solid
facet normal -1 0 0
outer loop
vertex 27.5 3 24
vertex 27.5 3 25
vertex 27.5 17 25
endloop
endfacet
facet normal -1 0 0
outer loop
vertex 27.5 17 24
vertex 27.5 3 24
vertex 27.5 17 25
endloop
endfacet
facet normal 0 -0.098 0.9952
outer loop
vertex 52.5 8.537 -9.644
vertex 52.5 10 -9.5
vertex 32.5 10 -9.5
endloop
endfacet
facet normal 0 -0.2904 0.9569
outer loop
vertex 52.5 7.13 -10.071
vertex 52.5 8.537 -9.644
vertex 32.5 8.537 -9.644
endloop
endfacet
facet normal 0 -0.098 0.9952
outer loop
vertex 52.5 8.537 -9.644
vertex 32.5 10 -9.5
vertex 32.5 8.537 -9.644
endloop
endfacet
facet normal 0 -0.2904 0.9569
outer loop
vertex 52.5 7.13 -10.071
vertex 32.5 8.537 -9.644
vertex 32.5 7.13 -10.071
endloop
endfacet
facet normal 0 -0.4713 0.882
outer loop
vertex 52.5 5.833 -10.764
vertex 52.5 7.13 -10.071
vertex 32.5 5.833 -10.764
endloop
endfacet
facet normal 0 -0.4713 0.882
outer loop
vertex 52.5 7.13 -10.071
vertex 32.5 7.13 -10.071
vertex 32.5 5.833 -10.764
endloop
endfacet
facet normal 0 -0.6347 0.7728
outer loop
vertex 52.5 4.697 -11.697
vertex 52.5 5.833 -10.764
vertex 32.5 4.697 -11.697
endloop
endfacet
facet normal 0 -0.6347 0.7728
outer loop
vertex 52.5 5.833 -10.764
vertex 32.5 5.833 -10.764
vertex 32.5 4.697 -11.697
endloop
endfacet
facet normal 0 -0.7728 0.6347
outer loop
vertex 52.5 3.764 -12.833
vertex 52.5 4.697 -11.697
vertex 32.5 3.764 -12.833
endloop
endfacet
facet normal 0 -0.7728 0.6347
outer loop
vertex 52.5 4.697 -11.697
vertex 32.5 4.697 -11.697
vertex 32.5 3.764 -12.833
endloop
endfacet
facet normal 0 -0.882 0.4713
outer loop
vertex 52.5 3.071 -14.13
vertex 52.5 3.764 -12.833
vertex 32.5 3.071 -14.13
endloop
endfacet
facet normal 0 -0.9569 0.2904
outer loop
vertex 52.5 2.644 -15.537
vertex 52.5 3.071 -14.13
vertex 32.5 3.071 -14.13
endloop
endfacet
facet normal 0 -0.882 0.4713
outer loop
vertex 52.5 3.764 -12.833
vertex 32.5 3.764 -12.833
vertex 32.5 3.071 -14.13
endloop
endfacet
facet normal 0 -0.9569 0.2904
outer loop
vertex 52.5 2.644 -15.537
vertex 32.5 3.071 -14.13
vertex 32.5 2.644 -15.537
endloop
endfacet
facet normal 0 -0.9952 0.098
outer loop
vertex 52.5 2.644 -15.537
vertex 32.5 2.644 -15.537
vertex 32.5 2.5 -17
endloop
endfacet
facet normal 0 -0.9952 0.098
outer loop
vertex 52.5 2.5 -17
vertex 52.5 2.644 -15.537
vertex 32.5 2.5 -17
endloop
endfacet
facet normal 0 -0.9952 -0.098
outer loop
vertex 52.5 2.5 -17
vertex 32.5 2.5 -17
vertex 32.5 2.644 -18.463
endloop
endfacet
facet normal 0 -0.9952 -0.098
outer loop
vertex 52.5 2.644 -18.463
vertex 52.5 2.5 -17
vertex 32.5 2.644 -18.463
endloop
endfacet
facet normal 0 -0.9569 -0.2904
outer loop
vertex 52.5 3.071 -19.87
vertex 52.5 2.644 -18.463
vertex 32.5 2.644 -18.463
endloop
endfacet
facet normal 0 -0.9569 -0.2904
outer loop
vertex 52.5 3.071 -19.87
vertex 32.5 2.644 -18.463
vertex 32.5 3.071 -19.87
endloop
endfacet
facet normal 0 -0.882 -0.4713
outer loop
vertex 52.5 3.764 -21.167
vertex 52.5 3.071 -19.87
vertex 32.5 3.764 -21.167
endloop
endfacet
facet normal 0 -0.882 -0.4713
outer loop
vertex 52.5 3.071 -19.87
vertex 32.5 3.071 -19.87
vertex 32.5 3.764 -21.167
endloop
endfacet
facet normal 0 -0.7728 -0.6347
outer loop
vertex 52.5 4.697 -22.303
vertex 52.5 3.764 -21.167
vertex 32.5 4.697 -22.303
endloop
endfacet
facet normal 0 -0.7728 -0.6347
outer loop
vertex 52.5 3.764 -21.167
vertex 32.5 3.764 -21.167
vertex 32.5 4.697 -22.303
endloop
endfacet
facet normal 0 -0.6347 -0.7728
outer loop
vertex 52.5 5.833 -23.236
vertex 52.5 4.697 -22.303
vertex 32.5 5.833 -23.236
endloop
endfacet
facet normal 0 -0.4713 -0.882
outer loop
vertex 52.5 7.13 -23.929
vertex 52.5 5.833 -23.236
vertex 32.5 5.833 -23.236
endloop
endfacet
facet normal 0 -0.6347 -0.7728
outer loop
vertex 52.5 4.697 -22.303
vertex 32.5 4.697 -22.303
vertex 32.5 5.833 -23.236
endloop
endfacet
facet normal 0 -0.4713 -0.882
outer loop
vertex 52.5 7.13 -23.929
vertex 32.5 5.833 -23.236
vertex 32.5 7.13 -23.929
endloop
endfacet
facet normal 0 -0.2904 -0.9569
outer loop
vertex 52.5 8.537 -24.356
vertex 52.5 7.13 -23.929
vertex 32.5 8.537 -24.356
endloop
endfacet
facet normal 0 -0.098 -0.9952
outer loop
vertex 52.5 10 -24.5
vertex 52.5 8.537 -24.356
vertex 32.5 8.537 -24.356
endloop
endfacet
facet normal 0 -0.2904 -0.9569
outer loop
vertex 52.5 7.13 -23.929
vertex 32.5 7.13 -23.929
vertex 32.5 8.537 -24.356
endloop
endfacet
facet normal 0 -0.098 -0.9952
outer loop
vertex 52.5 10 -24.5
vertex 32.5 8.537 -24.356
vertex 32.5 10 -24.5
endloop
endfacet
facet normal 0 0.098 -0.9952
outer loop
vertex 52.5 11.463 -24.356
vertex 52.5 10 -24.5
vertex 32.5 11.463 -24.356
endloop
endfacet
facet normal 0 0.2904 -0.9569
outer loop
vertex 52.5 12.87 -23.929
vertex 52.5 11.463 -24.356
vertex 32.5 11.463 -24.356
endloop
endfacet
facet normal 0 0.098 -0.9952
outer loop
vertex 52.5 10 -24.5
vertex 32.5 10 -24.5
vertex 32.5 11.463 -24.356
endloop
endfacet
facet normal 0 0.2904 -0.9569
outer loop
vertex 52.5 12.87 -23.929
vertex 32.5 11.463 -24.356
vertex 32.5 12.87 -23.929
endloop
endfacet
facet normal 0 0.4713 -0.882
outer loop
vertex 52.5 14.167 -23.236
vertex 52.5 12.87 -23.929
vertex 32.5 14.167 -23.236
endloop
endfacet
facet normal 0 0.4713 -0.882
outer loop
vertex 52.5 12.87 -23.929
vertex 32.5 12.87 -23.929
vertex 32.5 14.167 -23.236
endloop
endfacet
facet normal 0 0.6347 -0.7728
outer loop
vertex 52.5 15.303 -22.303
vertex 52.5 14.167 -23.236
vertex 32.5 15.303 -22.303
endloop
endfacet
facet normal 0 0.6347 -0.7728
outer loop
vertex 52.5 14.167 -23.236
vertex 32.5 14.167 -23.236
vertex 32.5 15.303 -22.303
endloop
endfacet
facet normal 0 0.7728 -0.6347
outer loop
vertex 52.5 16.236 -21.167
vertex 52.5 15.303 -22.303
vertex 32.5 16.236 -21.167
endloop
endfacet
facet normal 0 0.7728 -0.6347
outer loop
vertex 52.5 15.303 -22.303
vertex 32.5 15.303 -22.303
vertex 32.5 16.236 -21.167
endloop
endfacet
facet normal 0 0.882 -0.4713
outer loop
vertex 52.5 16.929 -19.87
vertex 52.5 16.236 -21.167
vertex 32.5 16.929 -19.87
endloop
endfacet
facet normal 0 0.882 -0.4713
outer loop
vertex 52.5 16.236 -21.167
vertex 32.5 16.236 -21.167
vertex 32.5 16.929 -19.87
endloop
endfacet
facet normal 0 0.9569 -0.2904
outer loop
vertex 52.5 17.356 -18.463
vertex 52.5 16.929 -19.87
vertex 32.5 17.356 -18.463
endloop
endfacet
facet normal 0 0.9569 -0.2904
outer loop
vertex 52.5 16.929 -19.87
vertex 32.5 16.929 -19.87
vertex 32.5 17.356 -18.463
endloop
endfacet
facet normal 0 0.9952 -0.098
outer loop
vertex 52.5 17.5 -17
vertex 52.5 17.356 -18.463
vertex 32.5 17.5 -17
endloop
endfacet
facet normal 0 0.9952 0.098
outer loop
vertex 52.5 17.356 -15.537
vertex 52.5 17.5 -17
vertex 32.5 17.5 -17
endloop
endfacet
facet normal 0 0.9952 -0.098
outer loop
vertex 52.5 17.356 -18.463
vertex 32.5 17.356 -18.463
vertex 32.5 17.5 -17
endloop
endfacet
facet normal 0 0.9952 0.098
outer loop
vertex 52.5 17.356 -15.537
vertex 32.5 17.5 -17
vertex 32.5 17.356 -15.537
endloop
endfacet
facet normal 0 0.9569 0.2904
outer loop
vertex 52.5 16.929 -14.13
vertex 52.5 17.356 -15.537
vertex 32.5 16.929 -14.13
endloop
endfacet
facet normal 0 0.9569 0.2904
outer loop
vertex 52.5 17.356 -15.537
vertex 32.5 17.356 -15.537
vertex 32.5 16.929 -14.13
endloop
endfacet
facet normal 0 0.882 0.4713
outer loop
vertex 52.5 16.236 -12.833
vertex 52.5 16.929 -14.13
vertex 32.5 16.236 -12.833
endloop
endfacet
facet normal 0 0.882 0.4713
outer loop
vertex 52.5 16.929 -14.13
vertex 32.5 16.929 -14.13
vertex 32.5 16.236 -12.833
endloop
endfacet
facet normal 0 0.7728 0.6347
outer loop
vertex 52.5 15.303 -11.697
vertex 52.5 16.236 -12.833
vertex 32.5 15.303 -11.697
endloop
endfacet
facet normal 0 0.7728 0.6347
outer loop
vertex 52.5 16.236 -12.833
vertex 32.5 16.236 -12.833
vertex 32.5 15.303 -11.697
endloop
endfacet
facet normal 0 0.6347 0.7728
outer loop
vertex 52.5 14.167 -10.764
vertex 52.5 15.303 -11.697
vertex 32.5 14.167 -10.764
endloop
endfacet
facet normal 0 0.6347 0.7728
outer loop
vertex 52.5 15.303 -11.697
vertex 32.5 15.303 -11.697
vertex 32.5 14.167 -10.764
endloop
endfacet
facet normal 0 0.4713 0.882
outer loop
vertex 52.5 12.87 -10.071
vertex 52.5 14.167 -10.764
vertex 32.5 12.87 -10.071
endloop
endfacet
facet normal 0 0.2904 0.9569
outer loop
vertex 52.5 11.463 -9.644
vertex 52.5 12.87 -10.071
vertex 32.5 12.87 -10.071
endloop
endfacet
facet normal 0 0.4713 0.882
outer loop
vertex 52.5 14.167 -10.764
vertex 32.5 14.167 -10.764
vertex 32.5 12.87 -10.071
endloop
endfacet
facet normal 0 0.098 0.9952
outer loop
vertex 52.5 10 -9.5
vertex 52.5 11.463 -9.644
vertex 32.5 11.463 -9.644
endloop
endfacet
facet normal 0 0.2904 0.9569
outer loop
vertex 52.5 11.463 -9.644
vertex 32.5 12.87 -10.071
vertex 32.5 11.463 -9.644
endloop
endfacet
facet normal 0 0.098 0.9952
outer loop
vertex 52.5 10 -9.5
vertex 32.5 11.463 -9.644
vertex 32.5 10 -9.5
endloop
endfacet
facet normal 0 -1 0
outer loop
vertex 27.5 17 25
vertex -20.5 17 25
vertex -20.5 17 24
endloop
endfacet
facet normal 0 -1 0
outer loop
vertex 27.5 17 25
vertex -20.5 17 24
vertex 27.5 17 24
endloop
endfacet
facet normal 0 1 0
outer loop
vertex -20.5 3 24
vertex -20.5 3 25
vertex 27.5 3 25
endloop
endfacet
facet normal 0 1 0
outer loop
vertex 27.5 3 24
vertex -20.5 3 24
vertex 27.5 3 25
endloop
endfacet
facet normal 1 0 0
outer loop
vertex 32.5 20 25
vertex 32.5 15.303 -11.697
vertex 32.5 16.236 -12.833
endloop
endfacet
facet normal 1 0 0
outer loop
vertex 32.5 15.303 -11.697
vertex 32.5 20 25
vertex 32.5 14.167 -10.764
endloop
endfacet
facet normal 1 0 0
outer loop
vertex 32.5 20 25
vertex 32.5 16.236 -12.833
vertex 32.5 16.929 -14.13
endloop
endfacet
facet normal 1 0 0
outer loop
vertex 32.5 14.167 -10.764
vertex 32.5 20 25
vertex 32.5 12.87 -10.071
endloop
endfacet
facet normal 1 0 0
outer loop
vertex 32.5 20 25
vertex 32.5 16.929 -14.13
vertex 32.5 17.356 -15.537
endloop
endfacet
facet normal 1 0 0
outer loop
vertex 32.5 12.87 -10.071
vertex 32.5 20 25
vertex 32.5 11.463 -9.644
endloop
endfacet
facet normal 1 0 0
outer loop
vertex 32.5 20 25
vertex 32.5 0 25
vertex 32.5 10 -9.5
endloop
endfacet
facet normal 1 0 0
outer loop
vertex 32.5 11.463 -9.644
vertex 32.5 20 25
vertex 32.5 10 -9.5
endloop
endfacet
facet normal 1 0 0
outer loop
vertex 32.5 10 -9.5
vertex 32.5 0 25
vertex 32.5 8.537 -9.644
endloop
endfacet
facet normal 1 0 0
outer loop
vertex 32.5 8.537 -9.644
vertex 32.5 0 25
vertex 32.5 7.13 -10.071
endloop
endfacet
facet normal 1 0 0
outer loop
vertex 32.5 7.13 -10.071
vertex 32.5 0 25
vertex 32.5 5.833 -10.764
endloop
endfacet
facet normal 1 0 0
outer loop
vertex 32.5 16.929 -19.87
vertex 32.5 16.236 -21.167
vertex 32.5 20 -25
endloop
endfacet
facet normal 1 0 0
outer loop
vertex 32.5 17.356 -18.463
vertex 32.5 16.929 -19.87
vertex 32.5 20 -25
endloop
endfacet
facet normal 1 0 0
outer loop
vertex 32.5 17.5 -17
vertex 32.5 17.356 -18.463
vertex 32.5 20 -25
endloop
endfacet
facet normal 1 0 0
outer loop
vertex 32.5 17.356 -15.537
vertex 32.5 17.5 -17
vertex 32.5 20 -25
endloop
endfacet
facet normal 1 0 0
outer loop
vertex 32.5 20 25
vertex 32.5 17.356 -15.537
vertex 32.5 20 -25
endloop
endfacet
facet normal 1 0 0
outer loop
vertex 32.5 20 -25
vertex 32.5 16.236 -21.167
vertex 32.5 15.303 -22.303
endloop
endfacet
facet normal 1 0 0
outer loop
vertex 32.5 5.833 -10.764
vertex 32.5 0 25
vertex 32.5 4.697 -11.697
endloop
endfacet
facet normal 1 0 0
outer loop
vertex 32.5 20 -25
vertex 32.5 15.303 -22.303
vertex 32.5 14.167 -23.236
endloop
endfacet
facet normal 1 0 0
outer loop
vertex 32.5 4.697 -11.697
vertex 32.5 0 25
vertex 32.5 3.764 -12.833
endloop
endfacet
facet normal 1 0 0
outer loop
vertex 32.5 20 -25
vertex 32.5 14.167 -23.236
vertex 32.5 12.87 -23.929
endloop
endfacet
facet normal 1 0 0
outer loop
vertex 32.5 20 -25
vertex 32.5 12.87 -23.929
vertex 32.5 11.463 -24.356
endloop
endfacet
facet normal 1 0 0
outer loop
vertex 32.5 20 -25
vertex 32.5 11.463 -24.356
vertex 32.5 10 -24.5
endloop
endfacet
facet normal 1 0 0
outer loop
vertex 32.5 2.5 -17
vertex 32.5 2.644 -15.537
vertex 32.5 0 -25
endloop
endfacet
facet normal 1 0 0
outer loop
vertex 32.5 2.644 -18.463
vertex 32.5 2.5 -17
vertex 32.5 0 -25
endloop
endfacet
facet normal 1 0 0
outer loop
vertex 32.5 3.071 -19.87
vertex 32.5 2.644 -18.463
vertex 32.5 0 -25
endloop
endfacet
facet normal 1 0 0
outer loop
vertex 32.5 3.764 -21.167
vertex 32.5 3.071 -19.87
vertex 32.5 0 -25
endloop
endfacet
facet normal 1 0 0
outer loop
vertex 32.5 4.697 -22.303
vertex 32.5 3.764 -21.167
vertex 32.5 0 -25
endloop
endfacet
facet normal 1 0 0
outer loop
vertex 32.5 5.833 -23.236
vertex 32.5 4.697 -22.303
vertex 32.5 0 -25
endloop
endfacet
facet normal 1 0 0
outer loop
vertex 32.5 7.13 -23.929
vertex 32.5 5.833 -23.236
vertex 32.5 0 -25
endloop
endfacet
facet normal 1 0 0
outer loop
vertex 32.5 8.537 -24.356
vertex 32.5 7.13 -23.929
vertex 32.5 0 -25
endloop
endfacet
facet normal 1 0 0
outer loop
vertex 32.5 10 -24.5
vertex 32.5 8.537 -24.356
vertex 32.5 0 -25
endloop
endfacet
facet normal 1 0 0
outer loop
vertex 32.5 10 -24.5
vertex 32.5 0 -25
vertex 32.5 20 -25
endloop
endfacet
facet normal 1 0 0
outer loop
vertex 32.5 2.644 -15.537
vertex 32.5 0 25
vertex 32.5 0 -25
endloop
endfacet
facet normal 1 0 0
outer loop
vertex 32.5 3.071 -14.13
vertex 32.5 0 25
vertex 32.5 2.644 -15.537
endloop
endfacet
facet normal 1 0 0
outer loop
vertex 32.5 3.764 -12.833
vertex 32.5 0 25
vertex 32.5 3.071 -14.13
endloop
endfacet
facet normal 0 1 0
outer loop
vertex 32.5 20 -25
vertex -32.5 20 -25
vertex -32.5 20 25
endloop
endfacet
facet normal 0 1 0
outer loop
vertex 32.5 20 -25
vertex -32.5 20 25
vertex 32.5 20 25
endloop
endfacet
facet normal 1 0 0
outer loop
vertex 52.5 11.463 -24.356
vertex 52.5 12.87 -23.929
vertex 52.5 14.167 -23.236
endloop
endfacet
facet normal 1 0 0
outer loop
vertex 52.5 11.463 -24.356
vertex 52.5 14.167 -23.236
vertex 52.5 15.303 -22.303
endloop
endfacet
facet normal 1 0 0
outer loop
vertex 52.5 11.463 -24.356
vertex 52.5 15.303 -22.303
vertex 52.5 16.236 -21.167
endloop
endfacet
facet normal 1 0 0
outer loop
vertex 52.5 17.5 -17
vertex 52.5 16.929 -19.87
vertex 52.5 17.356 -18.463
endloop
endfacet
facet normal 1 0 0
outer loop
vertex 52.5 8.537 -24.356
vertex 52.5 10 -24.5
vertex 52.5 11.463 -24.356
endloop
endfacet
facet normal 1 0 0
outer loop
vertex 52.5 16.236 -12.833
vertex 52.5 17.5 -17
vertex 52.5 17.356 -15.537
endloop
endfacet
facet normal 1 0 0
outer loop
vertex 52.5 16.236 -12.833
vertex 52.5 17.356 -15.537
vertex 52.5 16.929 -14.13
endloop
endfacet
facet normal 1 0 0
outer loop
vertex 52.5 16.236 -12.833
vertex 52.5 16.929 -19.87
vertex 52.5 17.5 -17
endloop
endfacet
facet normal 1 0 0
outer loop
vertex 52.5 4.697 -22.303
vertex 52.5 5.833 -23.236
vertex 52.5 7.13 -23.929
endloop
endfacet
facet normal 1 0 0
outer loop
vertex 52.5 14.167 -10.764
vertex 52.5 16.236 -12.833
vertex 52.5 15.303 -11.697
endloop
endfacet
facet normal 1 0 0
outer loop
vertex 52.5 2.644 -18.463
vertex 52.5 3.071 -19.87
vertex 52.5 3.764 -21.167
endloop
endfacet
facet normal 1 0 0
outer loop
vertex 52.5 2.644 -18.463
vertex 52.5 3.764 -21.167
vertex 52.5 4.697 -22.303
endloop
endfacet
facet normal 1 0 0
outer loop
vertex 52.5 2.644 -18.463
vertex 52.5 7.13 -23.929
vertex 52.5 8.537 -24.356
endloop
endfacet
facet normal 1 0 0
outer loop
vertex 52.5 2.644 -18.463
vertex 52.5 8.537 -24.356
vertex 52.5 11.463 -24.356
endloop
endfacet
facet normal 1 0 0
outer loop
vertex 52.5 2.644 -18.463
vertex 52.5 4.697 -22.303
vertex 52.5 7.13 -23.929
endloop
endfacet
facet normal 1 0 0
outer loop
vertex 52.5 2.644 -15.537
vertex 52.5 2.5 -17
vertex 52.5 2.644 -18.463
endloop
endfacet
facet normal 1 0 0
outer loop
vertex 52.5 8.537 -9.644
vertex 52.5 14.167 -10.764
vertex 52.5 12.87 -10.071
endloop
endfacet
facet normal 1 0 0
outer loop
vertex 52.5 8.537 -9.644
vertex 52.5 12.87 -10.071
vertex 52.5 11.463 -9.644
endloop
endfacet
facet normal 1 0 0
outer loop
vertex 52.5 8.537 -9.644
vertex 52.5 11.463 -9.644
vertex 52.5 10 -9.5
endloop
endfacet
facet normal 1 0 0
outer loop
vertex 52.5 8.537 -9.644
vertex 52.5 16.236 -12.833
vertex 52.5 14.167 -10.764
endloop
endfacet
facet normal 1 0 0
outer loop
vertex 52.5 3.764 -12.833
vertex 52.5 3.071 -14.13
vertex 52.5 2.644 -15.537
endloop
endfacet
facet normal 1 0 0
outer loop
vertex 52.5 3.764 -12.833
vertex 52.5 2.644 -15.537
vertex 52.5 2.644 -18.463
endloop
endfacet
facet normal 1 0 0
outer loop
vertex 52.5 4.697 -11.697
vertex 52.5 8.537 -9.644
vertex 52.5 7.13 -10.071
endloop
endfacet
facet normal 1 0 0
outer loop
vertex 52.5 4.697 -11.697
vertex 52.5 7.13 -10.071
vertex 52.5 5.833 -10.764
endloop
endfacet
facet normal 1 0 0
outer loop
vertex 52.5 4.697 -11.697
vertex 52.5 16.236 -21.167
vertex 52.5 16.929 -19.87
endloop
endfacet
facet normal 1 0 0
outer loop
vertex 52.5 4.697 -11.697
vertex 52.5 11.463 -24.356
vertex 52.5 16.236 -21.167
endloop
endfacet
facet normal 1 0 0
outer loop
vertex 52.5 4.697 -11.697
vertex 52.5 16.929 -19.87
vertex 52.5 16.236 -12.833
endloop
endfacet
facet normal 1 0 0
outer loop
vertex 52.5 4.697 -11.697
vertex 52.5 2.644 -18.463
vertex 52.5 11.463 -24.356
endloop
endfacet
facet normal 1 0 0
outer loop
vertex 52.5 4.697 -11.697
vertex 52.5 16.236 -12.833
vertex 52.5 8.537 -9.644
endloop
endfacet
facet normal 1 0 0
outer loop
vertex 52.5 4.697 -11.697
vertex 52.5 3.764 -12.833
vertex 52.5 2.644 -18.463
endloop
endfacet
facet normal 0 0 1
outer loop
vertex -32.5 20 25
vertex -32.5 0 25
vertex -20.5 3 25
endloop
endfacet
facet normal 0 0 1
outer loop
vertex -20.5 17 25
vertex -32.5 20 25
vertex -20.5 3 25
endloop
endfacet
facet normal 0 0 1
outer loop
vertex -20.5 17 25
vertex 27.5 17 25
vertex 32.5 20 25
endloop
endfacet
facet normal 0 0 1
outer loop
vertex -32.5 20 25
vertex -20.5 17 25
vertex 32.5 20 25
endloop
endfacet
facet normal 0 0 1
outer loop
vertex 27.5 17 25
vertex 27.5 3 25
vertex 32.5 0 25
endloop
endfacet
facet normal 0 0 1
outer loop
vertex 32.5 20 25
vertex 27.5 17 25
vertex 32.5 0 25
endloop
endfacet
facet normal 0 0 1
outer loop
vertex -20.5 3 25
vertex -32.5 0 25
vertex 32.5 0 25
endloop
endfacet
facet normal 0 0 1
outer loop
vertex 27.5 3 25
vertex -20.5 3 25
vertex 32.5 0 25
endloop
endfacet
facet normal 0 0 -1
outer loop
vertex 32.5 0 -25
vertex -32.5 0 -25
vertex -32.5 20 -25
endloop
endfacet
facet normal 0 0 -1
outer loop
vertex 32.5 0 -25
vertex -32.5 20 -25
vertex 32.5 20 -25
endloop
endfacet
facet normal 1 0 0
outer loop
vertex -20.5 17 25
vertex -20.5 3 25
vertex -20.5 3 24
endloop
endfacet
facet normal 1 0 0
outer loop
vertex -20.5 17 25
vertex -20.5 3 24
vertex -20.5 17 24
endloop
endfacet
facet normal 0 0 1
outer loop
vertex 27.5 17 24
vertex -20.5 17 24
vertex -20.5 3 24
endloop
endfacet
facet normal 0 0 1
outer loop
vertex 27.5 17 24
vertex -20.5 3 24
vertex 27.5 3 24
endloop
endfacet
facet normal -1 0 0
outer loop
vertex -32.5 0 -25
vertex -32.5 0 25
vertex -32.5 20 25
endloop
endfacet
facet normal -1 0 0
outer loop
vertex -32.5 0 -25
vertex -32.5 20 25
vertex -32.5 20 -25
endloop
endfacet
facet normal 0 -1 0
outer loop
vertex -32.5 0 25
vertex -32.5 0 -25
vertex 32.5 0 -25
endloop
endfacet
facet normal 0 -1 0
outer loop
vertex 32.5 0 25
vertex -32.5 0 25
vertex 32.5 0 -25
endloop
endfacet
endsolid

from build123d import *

# Parameters (mm, degrees)
SKETCH2_W           = 65
SKETCH2_H           = 50
BOSS_EXTRUDE1_DEPTH = 20
SKETCH4_W           = 48
SKETCH4_H           = 14
CUT_EXTRUDE1_DEPTH  = 1
SKETCH5_R           = 7.5
BOSS_EXTRUDE2_DEPTH = 20


with BuildPart() as part:
    # Sketch2 → Boss-Extrude1 (new body)
    with BuildSketch(Plane(origin=(0, 0, 0), x_dir=(1, 0, 0), z_dir=(0, 1, 0))):
        Rectangle(SKETCH2_W, SKETCH2_H)
    extrude(amount=BOSS_EXTRUDE1_DEPTH)

    # Sketch4 → Cut-Extrude1 (cut)
    with BuildSketch(Plane.XY.offset(25)):
        with Locations((3.5, 10)):
            Rectangle(SKETCH4_W, SKETCH4_H)
    extrude(amount=-CUT_EXTRUDE1_DEPTH, mode=Mode.SUBTRACT)

    # Sketch5 → Boss-Extrude2 (add)
    with BuildSketch(Plane(origin=(32.5, 0, 0), x_dir=(0, 0, -1), z_dir=(1, 0, 0))):
        with Locations(Location((17, 10, 0), (0, 0, 180))):
            Circle(SKETCH5_R)
    extrude(amount=BOSS_EXTRUDE2_DEPTH)


solid = part.part
